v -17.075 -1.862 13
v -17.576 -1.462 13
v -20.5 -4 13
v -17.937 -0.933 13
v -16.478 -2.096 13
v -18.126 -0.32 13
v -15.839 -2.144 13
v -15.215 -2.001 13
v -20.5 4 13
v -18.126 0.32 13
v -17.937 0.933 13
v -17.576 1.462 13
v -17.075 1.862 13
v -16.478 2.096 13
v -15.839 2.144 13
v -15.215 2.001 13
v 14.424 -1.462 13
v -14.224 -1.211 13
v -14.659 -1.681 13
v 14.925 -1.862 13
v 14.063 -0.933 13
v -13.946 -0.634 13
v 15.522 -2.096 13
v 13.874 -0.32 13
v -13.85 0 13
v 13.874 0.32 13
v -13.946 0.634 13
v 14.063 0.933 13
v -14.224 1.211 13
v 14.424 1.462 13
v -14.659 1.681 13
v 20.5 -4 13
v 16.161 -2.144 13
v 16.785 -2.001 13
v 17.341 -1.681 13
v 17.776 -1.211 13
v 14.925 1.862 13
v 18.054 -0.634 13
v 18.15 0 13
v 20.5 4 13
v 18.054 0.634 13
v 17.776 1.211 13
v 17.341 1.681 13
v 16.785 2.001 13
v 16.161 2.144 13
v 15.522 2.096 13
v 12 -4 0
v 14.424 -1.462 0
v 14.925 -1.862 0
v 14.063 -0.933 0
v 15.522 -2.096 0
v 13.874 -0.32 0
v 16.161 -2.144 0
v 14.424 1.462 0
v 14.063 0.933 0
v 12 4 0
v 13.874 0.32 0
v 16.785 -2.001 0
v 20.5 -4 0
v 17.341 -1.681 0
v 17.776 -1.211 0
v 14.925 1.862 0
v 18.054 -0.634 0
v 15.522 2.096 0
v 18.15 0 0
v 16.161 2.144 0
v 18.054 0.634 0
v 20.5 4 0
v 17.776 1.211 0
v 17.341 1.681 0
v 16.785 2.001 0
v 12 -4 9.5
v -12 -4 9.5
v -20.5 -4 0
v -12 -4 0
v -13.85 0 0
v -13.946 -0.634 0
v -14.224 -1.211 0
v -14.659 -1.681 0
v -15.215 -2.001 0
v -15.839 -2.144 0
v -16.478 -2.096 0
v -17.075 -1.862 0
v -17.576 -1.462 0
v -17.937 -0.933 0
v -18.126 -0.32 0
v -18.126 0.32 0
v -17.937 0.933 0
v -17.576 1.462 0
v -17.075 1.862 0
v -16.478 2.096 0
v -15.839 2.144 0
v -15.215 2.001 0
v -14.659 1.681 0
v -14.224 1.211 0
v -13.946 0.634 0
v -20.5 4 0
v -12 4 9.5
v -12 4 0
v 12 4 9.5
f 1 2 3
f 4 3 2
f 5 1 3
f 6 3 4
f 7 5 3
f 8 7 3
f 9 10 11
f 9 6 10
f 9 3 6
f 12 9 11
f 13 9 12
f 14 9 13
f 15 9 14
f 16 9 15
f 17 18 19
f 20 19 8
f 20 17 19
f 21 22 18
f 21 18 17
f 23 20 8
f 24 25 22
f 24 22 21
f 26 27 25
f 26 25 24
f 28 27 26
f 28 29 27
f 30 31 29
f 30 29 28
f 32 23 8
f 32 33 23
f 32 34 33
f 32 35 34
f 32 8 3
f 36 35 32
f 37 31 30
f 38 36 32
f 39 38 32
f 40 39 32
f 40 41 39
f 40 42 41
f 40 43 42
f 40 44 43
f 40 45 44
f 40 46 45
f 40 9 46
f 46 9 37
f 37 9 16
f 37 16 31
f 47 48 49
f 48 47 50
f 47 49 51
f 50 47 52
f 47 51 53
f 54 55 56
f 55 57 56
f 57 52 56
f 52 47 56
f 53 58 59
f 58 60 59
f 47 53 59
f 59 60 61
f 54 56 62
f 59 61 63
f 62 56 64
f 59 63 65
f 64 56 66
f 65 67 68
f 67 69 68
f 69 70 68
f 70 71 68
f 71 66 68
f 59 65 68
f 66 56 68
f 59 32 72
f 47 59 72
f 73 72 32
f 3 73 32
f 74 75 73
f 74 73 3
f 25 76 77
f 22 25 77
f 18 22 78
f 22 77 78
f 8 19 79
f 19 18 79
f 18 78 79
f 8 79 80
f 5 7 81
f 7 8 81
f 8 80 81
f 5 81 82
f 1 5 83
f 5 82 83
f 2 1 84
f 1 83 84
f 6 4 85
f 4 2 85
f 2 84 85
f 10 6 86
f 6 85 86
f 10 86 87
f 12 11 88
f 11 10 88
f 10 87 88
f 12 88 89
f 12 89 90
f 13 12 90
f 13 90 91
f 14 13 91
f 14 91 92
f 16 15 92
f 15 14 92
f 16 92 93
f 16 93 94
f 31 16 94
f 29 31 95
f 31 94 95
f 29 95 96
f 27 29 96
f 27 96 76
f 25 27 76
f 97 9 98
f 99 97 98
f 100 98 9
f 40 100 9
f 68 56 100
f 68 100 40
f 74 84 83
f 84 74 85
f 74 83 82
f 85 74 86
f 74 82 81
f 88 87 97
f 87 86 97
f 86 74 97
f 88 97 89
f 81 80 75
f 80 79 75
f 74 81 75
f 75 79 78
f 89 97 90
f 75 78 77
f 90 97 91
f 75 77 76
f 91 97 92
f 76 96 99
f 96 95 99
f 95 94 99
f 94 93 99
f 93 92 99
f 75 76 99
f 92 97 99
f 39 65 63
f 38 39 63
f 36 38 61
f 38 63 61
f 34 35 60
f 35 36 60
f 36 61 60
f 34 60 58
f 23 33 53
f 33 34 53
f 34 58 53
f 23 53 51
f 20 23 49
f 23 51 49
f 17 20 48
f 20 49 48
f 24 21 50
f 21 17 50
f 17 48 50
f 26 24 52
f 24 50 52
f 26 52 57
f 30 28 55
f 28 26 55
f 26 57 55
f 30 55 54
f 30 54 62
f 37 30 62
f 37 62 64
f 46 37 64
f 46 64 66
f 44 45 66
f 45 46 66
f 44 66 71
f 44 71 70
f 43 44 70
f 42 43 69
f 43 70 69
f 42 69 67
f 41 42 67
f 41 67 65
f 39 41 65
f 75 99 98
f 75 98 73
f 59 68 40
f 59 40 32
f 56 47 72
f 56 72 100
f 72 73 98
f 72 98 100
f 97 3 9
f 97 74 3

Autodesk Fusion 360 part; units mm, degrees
sketch "Sketch1" plane through (0, 0, 0) normal (0, 0, 1) x (1, 0, 0)
  line L0 (20.5, -4) -> (-20.5, -4)
  line L1 (-20.5, -4) -> (-20.5, 4)
  line L2 (-20.5, 4) -> (20.5, 4)
  line L3 (20.5, 4) -> (20.5, -4)
  line L4 (20.5, -4) -> (-20.5, 4) construction
  line L5 (-20.5, -4) -> (20.5, 4) construction
  line L6 (-16, 0) -> (16, 0) construction
  circle A0 centre (-16, 0) radius 2.15
  circle A1 centre (16, 0) radius 2.15
  dimension "d1" = 8
  dimension "d2" = 41
  dimension "d3" = 32
  dimension "d4" = 4.3
  dimension "d5" = 4.3
extrude "Extrude1" add sketch "Sketch1" along normal blind 13
sketch "Sketch3" plane through (0, 0, 0) normal (0, 0, -1) x (1, 0, 0)
  circle A0 centre (16, 0) radius 2.15
  circle A1 centre (-16, 0) radius 2.15
  line L0 (-20.5, -4) -> (20.5, -4)
  line L1 (20.5, -4) -> (20.5, 4)
  line L2 (20.5, 4) -> (-20.5, 4)
  line L3 (-20.5, 4) -> (-20.5, -4)
  line L4 (12, -4) -> (-12, -4)
  line L5 (-12, -4) -> (-12, 4)
  line L6 (-12, 4) -> (12, 4)
  line L7 (12, 4) -> (12, -4)
  line L8 (12, -4) -> (-12, 4) construction
  line L9 (-12, -4) -> (12, 4) construction
  dimension "d9" = 24
extrude "Extrude2" cut sketch "Sketch3" against normal blind 9.5 contours L0 L2 L4 L5 L6 L7
